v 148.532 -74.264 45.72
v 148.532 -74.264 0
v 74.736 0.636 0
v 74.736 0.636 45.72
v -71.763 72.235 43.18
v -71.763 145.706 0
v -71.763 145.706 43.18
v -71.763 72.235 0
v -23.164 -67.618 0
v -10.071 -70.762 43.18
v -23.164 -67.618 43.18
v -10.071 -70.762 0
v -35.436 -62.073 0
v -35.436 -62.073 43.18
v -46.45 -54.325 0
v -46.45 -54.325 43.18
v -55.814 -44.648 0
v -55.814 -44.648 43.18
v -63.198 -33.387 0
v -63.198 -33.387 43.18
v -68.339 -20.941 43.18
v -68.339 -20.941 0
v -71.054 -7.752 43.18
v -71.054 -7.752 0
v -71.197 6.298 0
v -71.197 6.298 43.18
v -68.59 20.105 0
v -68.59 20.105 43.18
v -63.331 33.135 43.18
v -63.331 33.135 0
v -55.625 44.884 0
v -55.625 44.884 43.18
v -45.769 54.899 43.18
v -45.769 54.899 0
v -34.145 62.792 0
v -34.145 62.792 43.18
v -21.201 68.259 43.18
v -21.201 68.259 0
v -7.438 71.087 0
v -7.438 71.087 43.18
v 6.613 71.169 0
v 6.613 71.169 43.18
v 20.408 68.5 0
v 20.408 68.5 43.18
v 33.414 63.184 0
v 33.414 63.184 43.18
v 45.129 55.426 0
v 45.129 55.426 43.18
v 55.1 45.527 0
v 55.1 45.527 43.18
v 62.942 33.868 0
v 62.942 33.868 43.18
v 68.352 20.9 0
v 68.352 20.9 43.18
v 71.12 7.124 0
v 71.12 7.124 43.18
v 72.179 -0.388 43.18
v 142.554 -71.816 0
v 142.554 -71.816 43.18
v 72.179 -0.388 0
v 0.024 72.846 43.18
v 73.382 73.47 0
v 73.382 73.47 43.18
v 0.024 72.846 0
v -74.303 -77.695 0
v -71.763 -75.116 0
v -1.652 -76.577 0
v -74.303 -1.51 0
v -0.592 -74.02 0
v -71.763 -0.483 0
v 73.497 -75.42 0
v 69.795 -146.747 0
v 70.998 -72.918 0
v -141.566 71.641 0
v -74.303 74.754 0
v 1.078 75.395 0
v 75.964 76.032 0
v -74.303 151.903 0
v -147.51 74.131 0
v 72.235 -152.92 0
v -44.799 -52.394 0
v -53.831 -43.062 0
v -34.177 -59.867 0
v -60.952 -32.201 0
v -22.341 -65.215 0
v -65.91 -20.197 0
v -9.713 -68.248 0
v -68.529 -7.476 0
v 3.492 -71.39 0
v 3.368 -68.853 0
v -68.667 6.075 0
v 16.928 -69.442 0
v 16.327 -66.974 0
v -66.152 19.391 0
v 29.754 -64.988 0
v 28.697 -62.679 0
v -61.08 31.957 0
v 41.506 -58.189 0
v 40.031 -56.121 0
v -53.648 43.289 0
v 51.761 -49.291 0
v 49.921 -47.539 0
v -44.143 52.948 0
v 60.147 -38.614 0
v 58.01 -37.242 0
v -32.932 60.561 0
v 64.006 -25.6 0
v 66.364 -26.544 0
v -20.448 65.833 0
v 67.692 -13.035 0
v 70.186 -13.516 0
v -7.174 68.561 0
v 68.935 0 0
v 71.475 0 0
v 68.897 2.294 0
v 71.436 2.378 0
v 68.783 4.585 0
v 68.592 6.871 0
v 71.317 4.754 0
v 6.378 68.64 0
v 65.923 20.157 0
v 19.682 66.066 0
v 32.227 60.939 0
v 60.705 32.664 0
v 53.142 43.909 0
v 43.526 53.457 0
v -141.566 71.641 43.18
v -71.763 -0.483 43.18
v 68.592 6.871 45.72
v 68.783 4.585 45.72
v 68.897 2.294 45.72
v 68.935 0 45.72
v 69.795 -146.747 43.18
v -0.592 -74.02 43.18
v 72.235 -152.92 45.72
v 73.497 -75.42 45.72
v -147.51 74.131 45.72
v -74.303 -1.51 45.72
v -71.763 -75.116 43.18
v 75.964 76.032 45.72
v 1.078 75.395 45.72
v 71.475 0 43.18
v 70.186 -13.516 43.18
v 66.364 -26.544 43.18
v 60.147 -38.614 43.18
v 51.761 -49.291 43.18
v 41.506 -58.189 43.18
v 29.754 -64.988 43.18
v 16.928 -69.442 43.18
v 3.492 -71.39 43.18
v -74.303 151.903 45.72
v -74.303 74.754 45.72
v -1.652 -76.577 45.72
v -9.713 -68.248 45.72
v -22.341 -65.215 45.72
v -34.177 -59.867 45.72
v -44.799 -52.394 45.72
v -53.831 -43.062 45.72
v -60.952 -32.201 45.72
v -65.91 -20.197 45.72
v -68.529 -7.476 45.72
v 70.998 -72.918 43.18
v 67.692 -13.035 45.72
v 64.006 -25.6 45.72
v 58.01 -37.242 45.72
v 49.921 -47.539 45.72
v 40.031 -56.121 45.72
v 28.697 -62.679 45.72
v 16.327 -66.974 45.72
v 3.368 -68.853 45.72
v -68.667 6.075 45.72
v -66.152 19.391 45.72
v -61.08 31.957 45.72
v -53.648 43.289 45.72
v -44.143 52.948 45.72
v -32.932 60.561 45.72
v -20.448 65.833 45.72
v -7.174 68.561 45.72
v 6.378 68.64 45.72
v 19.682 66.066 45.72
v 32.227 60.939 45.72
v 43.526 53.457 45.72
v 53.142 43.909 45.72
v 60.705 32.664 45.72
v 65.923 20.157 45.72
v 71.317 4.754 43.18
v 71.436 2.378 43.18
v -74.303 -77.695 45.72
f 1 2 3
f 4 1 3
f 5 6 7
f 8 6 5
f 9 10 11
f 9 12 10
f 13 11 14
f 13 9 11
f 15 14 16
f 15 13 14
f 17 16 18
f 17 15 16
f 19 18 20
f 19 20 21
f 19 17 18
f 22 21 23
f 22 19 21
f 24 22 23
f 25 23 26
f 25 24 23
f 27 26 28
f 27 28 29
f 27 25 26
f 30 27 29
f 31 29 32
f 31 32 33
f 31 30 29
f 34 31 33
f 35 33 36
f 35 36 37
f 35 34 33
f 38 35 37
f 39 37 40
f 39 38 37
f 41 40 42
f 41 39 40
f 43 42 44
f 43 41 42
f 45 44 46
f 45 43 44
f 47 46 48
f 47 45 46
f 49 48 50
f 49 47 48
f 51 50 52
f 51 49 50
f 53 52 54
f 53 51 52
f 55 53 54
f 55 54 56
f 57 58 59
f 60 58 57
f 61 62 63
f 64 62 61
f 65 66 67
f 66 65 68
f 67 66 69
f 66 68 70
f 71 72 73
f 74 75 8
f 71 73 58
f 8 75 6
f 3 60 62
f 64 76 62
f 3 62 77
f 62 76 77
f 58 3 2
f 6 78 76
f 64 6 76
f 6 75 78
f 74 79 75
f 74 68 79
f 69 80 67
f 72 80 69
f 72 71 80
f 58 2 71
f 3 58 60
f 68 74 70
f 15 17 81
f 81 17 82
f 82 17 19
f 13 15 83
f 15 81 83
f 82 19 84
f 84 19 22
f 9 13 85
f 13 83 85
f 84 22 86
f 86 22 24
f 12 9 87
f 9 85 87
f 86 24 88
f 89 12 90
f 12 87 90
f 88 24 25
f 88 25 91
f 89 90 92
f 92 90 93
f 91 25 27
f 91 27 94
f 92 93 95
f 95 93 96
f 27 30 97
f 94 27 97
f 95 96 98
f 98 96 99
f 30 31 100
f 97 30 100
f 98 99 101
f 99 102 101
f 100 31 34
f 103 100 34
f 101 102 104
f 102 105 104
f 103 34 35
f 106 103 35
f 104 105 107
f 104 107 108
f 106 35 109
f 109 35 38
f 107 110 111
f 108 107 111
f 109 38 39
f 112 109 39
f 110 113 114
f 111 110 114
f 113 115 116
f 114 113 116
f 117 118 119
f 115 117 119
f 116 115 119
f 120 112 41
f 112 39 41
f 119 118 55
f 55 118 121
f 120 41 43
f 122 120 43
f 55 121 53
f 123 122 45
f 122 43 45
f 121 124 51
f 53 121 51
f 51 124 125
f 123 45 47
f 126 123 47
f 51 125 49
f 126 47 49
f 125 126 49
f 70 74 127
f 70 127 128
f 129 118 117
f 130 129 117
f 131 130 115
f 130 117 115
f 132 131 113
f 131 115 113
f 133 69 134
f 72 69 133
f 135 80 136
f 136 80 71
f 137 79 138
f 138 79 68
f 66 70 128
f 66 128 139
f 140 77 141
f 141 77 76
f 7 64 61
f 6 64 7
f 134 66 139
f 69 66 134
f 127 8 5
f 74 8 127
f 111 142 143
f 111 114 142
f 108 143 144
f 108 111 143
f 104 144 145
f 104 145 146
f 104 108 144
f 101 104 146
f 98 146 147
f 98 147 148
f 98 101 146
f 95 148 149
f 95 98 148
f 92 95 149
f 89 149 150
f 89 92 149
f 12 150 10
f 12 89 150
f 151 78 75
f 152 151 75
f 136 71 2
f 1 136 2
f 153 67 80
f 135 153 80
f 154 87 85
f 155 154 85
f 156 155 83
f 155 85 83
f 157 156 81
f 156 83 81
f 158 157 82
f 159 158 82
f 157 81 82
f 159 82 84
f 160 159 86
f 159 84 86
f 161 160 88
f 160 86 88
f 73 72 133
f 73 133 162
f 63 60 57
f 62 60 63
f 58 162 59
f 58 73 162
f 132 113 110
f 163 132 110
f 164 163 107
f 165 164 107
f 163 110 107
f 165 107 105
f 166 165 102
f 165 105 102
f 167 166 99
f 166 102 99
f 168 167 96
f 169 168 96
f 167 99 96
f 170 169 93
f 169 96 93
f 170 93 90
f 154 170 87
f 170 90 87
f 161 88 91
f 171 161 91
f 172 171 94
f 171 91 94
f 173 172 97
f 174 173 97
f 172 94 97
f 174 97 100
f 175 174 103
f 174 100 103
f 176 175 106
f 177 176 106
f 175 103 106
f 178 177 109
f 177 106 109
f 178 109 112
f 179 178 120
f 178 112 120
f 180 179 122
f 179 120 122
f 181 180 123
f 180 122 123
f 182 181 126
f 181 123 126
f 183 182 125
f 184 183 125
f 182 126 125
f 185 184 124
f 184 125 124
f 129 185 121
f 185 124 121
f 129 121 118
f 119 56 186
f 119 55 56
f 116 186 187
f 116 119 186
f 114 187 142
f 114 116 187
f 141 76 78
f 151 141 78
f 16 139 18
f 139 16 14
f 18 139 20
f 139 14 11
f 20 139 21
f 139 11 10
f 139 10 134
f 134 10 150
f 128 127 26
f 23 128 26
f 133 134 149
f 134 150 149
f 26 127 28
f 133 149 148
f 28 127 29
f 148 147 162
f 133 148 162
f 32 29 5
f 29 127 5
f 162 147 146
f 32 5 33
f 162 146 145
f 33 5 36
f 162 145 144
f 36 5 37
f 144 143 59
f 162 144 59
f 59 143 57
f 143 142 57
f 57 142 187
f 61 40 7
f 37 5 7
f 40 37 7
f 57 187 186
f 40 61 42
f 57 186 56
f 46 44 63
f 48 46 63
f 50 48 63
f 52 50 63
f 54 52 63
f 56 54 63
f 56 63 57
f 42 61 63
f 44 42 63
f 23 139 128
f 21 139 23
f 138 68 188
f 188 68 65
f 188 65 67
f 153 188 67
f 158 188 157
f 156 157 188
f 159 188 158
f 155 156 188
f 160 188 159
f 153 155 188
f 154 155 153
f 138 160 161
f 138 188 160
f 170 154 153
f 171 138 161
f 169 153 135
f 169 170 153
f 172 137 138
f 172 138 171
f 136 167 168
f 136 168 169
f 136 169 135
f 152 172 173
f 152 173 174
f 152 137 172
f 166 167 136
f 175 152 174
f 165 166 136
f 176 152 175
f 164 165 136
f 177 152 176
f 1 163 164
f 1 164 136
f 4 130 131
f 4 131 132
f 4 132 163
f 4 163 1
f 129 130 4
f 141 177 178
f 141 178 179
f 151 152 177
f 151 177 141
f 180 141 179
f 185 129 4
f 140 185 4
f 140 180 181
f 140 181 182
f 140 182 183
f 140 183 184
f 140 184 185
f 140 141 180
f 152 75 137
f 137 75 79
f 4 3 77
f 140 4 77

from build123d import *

# Parameters (mm, degrees)
F1_DEPTH = 45.72
F2_T     = -2.54


with BuildPart() as f1:
    # F0 (on Top) → F1 (new body)
    with BuildSketch(Plane.XY):
        Polygon((73.497205615, -75.4195482397), (148.5320329666, -74.2643550038), (74.735747165, 0.6356836955), align=None)
        with BuildLine():
            Line((73.497205615, -75.4195482397), (74.735747165, 0.6356836955))
            Line((74.735747165, 0.6356836955), (68.5921626755, 6.8711562673))
            ThreePointArc((68.5921626755, 6.8711562673), (68.8495817611, 3.4398634101), (68.9354594455, 0))
            ThreePointArc((68.9354594455, 0), (45.1804093562, -52.0656141744), (-9.7128356749, -68.247772067))
            Line((-9.7128356749, -68.247772067), (-1.652113798, -76.5765041298))
            Line((-1.652113798, -76.5765041298), (73.497205615, -75.4195482397))
        make_face()
        with BuildLine():
            Line((68.5921626755, 6.8711562673), (74.735747165, 0.6356836955))
            Line((74.735747165, 0.6356836955), (75.9635642171, 76.0323554277))
            Line((75.9635642171, 76.0323554277), (1.0778976806, 75.3952155197))
            Line((1.0778976806, 75.3952155197), (7.8886438881, 68.4826026562))
            ThreePointArc((7.8886438881, 68.4826026562), (49.1052036417, 48.3815723625), (68.5921626755, 6.8711562673))
        make_face()
        Polygon((72.235122323, -152.920410037), (73.497205615, -75.4195482397), (-1.652113798, -76.5765041298), align=None)
        with BuildLine():
            Line((-74.3026211858, -77.6949897408), (-1.652113798, -76.5765041298))
            Line((-1.652113798, -76.5765041298), (-9.7128356749, -68.247772067))
            ThreePointArc((-9.7128356749, -68.247772067), (-49.5352113263, -47.9412182554), (-68.5288572015, -7.4761821553))
            Line((-68.5288572015, -7.4761821553), (-74.3026211858, -1.5104468336))
            Line((-74.3026211858, -1.5104468336), (-74.3026211858, -77.6949897408))
        make_face()
        with BuildLine():
            ThreePointArc((-68.5288572015, -7.4761821553), (-48.5977686235, 48.891251301), (7.8886438881, 68.4826026562))
            Line((7.8886438881, 68.4826026562), (1.0778976806, 75.3952155197))
            Line((1.0778976806, 75.3952155197), (-74.3026211858, 74.7538653245))
            Line((-74.3026211858, 74.7538653245), (-74.3026211858, -1.5104468336))
            Line((-74.3026211858, -1.5104468336), (-68.5288572015, -7.4761821553))
        make_face()
        Polygon((-74.3026211858, 74.7538653245), (1.0778976806, 75.3952155197), (-74.3026211858, 151.9031822681), align=None)
        Polygon((-74.3026211858, -1.5104468336), (-74.3026211858, 74.7538653245), (-147.5100070238, 74.1310045123), align=None)
    extrude(amount=F1_DEPTH)

    # F2
    f2_openings = [f1.faces().sort_by_distance(p)[0] for p in [
        (108.607021, -39.796599, 0),
    ]]
    offset(amount=F2_T, openings=f2_openings, kind=Kind.INTERSECTION)


solid = f1.part
